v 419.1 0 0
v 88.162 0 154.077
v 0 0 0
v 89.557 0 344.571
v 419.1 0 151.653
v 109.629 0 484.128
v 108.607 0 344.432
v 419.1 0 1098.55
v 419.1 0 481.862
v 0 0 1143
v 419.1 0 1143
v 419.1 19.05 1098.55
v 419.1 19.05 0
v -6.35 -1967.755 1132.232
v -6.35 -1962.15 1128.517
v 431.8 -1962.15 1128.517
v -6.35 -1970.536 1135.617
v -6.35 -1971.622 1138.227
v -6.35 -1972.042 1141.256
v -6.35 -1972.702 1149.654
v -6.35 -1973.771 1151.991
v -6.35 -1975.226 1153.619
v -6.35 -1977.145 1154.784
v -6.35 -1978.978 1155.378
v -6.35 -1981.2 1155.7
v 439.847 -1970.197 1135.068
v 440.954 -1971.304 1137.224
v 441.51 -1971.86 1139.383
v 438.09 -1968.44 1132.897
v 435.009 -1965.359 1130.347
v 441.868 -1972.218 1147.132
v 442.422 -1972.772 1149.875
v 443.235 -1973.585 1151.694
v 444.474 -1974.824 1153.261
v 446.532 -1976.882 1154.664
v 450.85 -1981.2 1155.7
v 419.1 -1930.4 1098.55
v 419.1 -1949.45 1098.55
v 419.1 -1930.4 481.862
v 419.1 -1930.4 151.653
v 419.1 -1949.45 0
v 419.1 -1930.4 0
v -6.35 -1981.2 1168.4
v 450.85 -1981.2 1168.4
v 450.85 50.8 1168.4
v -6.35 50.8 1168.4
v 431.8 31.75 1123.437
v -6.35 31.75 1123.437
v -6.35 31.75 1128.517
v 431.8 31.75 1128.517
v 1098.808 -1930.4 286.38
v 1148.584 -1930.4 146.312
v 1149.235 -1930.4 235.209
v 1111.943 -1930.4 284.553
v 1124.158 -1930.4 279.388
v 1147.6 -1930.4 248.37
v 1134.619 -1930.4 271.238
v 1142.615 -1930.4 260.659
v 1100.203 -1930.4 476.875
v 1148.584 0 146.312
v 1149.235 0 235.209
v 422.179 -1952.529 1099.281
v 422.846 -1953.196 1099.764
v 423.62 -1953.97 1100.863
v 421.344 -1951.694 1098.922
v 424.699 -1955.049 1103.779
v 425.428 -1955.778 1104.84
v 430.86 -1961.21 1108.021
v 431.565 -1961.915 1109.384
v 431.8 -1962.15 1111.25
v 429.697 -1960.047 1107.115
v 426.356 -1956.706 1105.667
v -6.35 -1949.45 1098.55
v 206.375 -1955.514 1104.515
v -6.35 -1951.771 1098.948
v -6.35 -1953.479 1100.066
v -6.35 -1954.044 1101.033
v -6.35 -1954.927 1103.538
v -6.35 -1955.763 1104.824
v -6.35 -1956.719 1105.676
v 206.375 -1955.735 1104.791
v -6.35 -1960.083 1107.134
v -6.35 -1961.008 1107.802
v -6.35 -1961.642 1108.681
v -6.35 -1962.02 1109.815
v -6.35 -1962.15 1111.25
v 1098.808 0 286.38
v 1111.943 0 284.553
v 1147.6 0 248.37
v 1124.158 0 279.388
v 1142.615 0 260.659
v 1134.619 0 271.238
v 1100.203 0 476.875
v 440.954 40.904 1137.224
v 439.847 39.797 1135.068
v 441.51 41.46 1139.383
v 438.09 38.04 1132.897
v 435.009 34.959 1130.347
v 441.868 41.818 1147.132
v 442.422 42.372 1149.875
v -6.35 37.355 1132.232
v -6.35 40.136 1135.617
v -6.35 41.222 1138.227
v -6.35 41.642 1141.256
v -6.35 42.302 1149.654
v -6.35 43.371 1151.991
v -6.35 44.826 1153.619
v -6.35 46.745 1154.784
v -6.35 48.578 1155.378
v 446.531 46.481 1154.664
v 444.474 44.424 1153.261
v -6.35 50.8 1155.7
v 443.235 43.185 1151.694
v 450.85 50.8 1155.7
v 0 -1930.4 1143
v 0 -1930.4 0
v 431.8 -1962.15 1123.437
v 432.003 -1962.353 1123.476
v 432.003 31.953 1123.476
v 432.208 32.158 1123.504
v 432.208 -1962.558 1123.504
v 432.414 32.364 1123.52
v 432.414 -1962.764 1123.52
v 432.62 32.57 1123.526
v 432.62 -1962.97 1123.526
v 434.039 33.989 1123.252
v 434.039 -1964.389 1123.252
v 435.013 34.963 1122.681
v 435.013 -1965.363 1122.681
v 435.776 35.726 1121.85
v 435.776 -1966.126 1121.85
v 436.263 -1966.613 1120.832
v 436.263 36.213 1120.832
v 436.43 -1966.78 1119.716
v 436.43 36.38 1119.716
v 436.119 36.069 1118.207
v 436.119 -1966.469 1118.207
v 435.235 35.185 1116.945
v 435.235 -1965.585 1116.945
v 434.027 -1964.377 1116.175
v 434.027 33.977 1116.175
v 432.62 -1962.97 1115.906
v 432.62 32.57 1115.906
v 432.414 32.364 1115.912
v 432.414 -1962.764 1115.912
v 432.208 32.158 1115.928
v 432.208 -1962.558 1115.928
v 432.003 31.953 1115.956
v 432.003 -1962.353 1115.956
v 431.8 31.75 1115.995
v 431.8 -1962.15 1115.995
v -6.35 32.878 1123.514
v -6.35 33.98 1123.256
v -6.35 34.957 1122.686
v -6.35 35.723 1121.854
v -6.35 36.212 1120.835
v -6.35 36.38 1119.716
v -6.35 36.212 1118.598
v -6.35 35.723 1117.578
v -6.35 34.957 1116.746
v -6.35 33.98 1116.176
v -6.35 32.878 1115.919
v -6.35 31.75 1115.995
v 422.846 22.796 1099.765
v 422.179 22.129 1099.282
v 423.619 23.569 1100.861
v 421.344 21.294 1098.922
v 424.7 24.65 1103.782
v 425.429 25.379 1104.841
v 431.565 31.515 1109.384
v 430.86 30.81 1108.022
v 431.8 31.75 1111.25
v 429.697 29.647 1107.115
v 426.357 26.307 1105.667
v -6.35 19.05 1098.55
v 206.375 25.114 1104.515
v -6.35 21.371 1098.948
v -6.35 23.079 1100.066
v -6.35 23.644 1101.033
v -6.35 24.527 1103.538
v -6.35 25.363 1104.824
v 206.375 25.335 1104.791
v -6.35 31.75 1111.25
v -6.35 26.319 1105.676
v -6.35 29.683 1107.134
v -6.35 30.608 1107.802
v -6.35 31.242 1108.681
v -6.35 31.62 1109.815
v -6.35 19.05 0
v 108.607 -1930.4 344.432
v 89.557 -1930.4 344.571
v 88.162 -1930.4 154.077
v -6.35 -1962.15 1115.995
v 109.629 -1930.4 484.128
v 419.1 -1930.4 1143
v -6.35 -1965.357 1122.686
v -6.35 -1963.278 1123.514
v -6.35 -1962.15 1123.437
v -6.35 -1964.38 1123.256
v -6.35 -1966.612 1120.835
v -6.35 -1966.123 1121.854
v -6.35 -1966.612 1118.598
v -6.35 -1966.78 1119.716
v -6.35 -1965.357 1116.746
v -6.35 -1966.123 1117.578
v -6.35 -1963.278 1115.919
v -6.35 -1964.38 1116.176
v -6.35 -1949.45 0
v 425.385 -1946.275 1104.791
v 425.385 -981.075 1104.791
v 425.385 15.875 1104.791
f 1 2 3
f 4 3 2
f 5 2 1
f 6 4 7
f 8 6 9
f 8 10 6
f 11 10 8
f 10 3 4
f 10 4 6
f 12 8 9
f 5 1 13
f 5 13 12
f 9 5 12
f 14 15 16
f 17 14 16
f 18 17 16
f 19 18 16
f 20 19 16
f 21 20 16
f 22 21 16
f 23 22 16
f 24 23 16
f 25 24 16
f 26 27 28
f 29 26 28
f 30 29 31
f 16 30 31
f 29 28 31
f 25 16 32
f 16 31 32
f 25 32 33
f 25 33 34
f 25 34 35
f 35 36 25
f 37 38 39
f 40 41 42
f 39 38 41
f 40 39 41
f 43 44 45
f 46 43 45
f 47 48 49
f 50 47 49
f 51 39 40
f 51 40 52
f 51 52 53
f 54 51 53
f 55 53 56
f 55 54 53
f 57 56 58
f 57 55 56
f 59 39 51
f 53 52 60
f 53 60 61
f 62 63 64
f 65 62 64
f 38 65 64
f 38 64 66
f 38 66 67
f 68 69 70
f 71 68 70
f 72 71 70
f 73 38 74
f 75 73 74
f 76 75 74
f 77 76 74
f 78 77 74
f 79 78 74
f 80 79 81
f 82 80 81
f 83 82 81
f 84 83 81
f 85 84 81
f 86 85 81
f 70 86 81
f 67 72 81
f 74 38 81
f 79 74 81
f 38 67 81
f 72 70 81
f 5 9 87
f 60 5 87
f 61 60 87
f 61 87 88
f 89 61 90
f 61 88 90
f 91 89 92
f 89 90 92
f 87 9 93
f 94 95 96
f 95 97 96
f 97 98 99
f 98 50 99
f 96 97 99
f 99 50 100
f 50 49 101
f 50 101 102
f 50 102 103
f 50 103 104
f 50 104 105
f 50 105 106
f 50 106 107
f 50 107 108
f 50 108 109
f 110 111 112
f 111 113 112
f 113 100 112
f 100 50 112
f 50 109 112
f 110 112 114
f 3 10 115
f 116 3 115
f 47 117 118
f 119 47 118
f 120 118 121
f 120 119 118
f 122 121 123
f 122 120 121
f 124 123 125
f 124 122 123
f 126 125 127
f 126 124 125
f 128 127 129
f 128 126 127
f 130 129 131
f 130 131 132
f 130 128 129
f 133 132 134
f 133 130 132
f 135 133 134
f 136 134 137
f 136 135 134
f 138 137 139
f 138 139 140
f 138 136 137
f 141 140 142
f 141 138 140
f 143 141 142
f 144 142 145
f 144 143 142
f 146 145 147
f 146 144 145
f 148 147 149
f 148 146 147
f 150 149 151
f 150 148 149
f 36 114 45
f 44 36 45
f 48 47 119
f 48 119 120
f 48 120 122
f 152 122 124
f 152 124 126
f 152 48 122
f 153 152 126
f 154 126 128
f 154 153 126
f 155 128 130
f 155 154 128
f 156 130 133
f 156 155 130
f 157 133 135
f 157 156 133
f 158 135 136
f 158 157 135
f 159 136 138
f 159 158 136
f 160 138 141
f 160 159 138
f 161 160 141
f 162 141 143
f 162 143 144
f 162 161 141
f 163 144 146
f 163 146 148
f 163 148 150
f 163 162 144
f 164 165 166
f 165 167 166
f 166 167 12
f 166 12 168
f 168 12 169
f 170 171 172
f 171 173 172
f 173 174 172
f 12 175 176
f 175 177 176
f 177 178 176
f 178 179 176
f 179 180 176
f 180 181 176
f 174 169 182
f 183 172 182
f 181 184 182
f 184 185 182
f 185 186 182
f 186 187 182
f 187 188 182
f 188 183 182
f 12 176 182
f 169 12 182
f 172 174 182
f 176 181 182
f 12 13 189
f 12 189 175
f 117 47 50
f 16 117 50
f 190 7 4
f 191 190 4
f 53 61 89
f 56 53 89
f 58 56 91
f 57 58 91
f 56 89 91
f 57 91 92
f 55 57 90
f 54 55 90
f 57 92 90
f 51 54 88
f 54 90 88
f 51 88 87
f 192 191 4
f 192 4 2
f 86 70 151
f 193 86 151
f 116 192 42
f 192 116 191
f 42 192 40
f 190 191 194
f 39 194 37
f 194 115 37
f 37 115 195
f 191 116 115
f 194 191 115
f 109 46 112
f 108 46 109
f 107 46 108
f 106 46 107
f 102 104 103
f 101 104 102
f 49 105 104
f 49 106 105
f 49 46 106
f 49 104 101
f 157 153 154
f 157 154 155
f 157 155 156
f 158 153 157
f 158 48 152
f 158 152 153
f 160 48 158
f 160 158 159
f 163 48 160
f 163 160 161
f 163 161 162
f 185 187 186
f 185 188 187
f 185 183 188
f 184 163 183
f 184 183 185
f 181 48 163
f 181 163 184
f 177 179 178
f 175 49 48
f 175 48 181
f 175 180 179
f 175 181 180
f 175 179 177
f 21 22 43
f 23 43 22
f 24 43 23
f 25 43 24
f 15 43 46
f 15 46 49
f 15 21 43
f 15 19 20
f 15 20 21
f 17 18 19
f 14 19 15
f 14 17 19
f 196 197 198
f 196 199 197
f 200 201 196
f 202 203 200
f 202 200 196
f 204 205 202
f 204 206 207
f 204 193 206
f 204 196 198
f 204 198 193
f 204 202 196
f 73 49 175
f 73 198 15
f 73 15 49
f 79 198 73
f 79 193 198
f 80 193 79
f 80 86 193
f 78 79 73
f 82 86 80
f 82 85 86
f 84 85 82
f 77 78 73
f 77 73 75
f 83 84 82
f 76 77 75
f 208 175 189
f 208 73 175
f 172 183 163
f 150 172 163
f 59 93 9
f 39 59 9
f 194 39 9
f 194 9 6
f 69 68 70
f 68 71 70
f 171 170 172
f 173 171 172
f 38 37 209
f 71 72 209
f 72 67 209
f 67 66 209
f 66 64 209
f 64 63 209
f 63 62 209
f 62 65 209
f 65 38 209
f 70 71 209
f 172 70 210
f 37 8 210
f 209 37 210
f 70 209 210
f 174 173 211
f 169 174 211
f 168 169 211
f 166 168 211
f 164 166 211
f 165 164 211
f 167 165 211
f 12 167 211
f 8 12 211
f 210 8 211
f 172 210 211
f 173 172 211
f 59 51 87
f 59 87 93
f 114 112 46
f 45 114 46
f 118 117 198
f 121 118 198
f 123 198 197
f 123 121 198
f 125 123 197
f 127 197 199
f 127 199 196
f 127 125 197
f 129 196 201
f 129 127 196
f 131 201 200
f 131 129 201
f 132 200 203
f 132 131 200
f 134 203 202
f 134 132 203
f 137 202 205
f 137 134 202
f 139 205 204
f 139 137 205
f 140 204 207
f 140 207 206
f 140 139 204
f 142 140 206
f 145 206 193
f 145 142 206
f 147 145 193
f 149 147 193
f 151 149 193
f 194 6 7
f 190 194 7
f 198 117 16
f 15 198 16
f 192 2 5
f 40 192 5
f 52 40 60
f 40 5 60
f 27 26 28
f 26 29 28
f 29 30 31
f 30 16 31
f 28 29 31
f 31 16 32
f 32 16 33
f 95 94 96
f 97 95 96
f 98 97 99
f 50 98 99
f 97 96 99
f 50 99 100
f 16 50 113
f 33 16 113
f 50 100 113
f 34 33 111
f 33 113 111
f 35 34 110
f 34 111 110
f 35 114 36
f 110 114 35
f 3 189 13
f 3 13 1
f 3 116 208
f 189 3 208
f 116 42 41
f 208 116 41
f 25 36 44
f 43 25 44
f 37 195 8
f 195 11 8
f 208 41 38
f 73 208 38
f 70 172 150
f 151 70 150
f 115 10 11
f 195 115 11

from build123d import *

# Parameters (mm, degrees)
F2_DEPTH = 1930.4
F0_W     = 419.1
F0_H     = 1143
F3_DEPTH = 19.05
F4_W     = 419.1
F4_H     = 1143
F5_DEPTH = 19.05
F6_W     = 419.1
F6_H     = 1968.5
F7_DEPTH = 25.4
F8_W     = 1968.5
F8_H     = 1168.4
F9_DEPTH = 6.35


with BuildPart() as f2:
    # F1 (on face) → F2 (new body)
    with BuildSketch(Plane.XZ):
        with BuildLine():
            Line((108.6065509819, 344.4319603753), (89.5570616523, 344.5714461484))
            Line((89.5570616523, 344.5714461484), (88.1622039216, 154.0765528523))
            Line((88.1622039216, 154.0765528523), (1148.5837766035, 146.3118448179))
            Line((1148.5837766035, 146.3118448179), (1149.2347102111, 235.2094616894))
            ThreePointArc((1149.2347102111, 235.2094616894), (1134.6191504498, 271.2384684099), (1098.8080340604, 286.3800619632))
            Line((1098.8080340604, 286.3800619633), (1100.2028917911, 476.8749552594))
            Line((1100.2028917911, 476.8749552594), (109.6294466511, 484.1282154592))
            Line((109.6294466511, 484.1282154592), (108.6065509819, 344.4319603753))
        make_face()
    extrude(amount=F2_DEPTH)

    # F0 (on Front) → F3 (join)
    with BuildSketch(Plane.XZ):
        with Locations((209.55, 571.5)):
            Rectangle(F0_W, F0_H)
    extrude(amount=-F3_DEPTH)

    # F4 (on face) → F5 (join)
    with BuildSketch(Plane.XZ.offset(1930.4)):
        with Locations((209.55, 571.5)):
            Rectangle(F4_W, F4_H)
    extrude(amount=F5_DEPTH)

    # F6 (on face) → F7 (join)
    with BuildSketch(Plane.XY.offset(1143)):
        with Locations((209.55, -965.2)):
            Rectangle(F6_W, F6_H)
    extrude(amount=F7_DEPTH)

    # F8 (on face) → F9 (join)
    with BuildSketch(Plane(origin=(0, 0, 0), x_dir=(0, -1, 0), z_dir=(-1, 0, 0))):
        with Locations((965.2, 584.2)):
            Rectangle(F8_W, F8_H)
    extrude(amount=F9_DEPTH)

    # F11: sweep along a path in F11_path
    with BuildLine(Plane(origin=(-6.35, -1949.45, 1168.4), x_dir=(0, -1, 0), z_dir=(0, 0, -1))) as f11_path:
        Line((0, 0), (0, -425.45))
        Line((0, -425.45), (-1968.5, -425.45))
        Line((-1968.5, -425.45), (-1968.5, 0))
    # F10 (on face) → F11 (sweep)
    with BuildSketch(Plane(origin=(-6.35, 0, 0), x_dir=(0, -1, 0), z_dir=(-1, 0, 0))):
        with BuildLine():
            Line((1981.2, 1168.4), (1949.45, 1168.4))
            Line((1949.45, 1168.4), (1949.45, 1098.55))
            add(Edge.make_bspline(
                [(1962.15, 1111.25), (1962.1416161237, 1106.9891487415), (1957.1774713092, 1106.9528415694), (1954.0118440023, 1102.7857432431), (1953.9768222515, 1098.7964263007), (1949.45, 1098.55)],
                knots=[0, 0, 0, 0, 0.3590021576, 0.6464061804, 1, 1, 1, 1], degree=3))
            Line((1962.15, 1111.25), (1962.15, 1115.9953590012))
            ThreePointArc((1962.15, 1115.9953590012), (1966.7801046171, 1119.7160482407), (1962.15, 1123.4367374802))
            Line((1962.15, 1123.4367374802), (1962.15, 1128.5167374802))
            add(Edge.make_bspline(
                [(1981.2, 1155.7), (1974.85, 1155.2496847948), (1971.007321351, 1148.1964123857), (1973.3363183206, 1136.7566982676), (1966.6215965457, 1130.655364811), (1962.15, 1128.5167374802)],
                knots=[0, 0, 0, 0, 0.3355358805, 0.6499518775, 1, 1, 1, 1], degree=3))
            Line((1981.2, 1155.7), (1981.2, 1168.4))
        make_face()
    sweep(path=f11_path.line, transition=Transition.RIGHT)


solid = f2.part
